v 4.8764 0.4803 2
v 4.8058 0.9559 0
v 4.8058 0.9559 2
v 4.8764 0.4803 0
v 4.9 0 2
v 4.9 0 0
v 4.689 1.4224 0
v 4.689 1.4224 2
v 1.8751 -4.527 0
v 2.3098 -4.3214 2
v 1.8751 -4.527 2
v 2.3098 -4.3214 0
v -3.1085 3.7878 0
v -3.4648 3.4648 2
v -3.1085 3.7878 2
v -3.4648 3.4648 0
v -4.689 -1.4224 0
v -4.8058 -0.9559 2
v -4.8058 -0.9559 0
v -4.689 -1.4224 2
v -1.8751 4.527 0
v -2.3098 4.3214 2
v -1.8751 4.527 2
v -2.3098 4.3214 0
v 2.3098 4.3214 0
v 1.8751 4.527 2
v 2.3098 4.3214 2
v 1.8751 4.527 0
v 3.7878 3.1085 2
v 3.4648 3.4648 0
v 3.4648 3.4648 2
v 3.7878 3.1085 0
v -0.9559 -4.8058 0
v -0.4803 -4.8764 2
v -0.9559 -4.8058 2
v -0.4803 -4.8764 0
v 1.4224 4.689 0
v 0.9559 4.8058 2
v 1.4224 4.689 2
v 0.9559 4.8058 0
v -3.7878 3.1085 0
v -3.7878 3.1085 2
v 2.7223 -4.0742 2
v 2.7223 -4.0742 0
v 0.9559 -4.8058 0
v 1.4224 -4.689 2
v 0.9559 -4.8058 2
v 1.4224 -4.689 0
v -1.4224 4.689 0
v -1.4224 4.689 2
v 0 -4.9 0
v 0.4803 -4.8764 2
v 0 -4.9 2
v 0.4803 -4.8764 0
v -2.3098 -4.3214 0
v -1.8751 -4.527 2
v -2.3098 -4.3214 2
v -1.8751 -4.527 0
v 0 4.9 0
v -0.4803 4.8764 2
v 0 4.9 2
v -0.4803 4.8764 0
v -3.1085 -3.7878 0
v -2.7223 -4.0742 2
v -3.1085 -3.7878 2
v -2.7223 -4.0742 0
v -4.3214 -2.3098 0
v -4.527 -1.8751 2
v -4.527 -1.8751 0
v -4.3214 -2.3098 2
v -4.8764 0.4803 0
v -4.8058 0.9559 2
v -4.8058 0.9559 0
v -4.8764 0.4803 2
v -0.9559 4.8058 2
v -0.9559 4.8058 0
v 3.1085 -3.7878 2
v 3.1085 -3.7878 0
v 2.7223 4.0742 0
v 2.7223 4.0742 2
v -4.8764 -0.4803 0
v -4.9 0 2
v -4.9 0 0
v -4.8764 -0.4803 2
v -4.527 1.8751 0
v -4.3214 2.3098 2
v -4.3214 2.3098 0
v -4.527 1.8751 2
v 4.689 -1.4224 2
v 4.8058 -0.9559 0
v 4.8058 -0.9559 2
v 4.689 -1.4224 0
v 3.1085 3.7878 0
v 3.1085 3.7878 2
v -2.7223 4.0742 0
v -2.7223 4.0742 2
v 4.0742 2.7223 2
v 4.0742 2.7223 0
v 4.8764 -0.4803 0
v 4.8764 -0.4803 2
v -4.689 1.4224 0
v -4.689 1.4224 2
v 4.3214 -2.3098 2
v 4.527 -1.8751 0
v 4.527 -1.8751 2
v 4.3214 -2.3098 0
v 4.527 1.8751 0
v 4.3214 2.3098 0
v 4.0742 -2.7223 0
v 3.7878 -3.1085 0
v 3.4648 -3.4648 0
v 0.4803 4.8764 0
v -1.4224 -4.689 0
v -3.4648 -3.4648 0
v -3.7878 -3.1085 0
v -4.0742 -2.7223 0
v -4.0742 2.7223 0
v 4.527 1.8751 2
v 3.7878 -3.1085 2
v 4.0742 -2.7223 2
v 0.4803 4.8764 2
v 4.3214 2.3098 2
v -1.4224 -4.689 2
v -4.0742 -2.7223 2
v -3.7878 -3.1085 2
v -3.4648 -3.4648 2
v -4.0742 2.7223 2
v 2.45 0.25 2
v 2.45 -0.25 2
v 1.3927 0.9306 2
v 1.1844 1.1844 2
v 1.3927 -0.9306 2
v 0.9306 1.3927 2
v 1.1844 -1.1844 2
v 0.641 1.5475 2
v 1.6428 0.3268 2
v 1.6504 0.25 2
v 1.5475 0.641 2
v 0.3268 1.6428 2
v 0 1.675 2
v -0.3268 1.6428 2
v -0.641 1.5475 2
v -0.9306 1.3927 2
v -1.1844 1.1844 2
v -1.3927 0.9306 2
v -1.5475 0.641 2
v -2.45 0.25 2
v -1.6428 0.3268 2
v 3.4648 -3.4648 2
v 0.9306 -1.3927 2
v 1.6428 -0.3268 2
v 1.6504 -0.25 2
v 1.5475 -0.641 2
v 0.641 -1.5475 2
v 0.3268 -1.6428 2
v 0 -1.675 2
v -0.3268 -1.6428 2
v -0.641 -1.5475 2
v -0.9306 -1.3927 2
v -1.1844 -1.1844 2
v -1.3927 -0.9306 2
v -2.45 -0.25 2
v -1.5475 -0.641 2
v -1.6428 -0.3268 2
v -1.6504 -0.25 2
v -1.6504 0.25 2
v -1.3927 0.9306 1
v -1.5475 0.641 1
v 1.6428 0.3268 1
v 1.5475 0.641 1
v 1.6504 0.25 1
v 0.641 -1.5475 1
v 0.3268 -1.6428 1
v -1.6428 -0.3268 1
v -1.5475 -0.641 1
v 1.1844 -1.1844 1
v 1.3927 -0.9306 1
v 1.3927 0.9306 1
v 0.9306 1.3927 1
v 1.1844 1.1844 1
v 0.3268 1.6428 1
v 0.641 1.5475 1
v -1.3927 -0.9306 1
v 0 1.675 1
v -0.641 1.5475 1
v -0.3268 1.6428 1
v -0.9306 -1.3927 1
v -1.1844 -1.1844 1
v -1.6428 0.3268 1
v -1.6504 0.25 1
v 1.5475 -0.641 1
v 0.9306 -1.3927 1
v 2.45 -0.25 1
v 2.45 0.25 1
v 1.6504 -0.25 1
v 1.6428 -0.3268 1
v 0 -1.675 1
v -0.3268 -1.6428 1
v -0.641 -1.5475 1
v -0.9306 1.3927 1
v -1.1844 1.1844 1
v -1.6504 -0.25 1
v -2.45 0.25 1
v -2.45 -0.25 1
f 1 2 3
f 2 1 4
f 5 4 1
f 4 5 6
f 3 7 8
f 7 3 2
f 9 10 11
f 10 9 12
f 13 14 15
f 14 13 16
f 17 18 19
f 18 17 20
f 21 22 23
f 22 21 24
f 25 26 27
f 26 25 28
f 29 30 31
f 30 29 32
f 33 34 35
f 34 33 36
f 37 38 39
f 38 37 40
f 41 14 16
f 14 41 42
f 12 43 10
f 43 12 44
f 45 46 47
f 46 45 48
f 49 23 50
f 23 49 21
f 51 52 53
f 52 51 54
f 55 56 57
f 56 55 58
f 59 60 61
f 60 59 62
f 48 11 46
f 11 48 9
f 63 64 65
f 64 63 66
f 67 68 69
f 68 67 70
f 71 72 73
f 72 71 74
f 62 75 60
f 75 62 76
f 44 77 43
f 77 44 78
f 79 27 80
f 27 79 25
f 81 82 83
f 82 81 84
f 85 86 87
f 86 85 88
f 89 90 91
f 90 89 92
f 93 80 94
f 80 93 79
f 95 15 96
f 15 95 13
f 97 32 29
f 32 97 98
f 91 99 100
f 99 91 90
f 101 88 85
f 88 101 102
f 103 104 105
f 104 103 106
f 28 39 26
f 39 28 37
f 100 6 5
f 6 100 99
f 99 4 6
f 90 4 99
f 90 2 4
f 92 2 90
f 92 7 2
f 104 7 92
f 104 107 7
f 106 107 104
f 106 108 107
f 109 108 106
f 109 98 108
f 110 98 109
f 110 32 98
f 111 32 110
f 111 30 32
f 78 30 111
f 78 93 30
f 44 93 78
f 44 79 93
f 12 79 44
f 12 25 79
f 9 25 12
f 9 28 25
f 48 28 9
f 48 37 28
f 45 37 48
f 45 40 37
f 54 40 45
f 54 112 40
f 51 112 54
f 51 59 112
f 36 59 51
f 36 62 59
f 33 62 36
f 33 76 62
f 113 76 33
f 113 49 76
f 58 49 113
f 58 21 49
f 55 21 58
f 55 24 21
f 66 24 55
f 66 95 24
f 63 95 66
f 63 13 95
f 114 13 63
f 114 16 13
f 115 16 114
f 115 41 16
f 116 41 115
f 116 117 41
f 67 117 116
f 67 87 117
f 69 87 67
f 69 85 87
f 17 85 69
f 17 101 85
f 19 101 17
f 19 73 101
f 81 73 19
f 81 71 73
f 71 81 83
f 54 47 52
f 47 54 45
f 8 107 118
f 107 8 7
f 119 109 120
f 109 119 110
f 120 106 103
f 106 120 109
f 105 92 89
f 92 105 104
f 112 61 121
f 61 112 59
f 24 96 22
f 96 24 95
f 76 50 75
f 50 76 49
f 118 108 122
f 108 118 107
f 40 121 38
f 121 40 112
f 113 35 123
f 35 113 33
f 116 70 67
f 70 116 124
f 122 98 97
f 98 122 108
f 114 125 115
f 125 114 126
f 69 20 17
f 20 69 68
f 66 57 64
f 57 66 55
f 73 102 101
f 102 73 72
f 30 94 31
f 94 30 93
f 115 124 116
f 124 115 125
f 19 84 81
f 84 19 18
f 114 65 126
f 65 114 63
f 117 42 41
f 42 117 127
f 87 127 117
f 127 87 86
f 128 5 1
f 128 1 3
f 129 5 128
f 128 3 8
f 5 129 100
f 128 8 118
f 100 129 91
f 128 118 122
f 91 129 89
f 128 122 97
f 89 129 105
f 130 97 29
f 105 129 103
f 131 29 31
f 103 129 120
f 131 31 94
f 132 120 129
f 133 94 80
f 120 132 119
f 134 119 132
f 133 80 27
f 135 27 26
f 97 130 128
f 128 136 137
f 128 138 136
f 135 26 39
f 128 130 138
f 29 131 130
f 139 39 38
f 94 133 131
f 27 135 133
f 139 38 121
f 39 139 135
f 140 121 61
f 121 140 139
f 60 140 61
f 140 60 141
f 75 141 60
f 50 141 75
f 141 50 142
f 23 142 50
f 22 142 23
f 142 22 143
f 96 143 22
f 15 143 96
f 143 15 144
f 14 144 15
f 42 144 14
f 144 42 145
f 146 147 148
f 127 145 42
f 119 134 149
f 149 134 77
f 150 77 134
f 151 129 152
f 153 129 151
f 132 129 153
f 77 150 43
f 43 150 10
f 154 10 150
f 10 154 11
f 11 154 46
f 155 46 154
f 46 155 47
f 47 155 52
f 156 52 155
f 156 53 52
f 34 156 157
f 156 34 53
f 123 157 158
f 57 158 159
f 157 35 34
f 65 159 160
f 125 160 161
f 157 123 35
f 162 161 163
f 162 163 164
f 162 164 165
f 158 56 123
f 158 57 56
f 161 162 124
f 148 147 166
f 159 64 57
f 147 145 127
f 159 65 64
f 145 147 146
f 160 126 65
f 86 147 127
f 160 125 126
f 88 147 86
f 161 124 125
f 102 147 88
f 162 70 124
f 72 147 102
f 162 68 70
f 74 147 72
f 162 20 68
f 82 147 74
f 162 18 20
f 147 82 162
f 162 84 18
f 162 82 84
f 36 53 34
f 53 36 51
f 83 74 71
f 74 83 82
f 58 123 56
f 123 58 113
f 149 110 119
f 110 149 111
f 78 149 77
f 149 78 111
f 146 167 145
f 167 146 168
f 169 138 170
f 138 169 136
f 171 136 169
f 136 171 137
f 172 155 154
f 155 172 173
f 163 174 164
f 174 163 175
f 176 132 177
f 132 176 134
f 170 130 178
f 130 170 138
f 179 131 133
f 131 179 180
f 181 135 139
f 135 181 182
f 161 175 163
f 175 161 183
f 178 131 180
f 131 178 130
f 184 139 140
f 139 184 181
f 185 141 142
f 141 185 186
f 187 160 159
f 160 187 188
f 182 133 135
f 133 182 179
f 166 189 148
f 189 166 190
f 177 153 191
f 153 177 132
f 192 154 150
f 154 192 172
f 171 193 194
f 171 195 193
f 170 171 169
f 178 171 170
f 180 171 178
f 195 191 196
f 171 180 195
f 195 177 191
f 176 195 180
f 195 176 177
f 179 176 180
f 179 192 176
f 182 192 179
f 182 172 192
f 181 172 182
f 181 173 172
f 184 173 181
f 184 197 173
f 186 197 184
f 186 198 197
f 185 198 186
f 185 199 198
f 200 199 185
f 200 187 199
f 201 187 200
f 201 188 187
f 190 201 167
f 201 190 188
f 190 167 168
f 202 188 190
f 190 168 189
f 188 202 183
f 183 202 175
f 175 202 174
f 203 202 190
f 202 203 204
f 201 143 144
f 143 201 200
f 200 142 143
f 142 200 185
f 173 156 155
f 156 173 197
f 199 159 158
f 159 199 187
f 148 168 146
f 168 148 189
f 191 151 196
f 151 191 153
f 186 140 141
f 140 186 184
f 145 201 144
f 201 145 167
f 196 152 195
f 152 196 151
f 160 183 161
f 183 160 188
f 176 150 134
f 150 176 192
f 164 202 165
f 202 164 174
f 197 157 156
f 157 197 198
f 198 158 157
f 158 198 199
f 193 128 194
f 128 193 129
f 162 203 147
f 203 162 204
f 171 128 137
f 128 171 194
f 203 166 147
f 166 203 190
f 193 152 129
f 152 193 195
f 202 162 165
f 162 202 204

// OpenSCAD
// file: params.scad
// --- Display ---
display_w        = 112.5;  // display panel width  (mm) — portrait
display_h        = 170;    // display panel height (mm) — portrait
disp_thickness   =   1.25; // display panel thickness (mm)
screen_area_w    = 100;    // active screen width  (mm)
screen_area_h    = 165;    // active screen height (mm)
display_border_wide  =  9.5;  // wide border (long edge, assumed right; TBD after driver rotation)
display_border_narrow=  2.5;  // narrow border (long edge)
display_border_short =  2;    // short-edge border (top and bottom)

// --- Cavities (back shell interior) ---
elec_w         =  65;    // Pi Zero width  (mm)
elec_l         =  30;    // Pi Zero length (mm)
elec_depth     =  16;    // Pi Zero + PiSugar stack depth (mm) — 15.7mm actual
hat_w          =  30;    // Waveshare HAT width  (mm) — rotated 90° in case
hat_l          =  66;    // Waveshare HAT length (mm)
hat_depth      =   9.5;  // Waveshare HAT depth  (mm)
bat_w          =  28;    // battery width  (mm) — portrait: 28×59 footprint
bat_l          =  59;    // battery length (mm)
bat_depth      =  12.5;  // battery depth  (mm) — 10.7 body + 1.8 magnet

// --- Primitives first (no dependencies) ---
case_w         = 135;    // width  (mm) — 135mm clears 4mm nut towers with 1.5mm margin right of display
case_h         = 210;    // height (mm) — 2+170+35+2=209 → 210
front_depth    =   2;    // front bezel thickness (mm)
back_depth     =  20;    // back shell depth (mm) — elec_depth 15.7 + 2 wall + 2.3 clearance; unconfirmed
fillet_r       =   2;    // outer-edge fillet radius (mm)
edge_overhang_angle = 55; // chamfer→fillet transition (deg from horizontal); 45=safe, 55=X1C tuned
tol            = 0.2;    // FDM clearance on each mating face (mm)
wall_t         = 2;      // nominal wall thickness (mm)

// --- PiSugar flex-tab buttons (south wall) ---
btn_hinge_w   = 0.8;  // hinge strip width (mm) — right short edge, in-layer bending
btn_slot_kerf = 0.5;  // slot kerf width (mm) — 1 nozzle diameter

// --- Button area (front face, lower section below display) ---
btn_area_h     =  35;    // height of button zone at bottom of front face (mm)
btn_rows       =   2;
btn_cols       =   4;
btn_hole_tolerance = 0.2;
btn_hole_diameter = 10; // button hole diameter (mm) — physical cap sized to fit with tol clearance
btn_fillet_r   =   2;    // fillet radius on button hole outer edge (mm)
btn_zone_w     = case_w / btn_cols;   // each button is centred in its zone
btn_row_y1     = btn_area_h / 2 - 7;  // bottom row y centre
btn_row_y2     = btn_area_h / 2 + 7;  // top row y centre (closer to display)

// --- Magnet recesses (back plate inner face) ---
magnet_d            = 15;   // diameter (mm) — derived from PiSugar image; tune after measuring
magnet_recess_depth = 1.5;  // depth into back plate; leaves 0.5mm wall

// --- Mating-face rabbet/tongue joint ---
rabbet_w       = 1;      // rabbet width into inner wall face (mm)
rabbet_d       = 1.5;    // rabbet depth from mating face (mm) — 2mm coincided with HDMI outer top

// --- M2 fasteners ---
screw_boss_id  = 2.4;    // screw shank clearance diameter (mm)
screw_head_d   = 3.8;    // screw head diameter (mm) — M2 button head
screw_head_h   = 1.4;    // screw head height (mm) — sinks fully in 2mm wall
screw_depth    = 25;     // total clearance hole depth from exterior (mm)
nut_af         = 4;      // hex nut across-flats (mm)
nut_t          = 1.6;    // hex nut thickness (mm)
tower_h        = 17;     // nut tower height from front plate inner face (mm) — 17mm leaves 1mm above back floor
tower_w        = 15;     // nut tower width in Y (mm)
// Y centres of the two screws per side; symmetric around case_h/2, clear of Pi stack (Y<32)
side_screw_y   = [case_h / 2 - case_h * 0.3, case_h / 2 + case_h * 0.3];

// --- USB-C notch ---
usbc_notch_w   =  12;    // notch width  (mm)
usbc_notch_h   =   4;    // notch height (mm)

// --- Derived positions (all dependencies above) ---
// Y=0 at bottom (USB-C / south face); X=0 at left inner wall
_elec_x  = wall_t;                   // Pi Zero left edge
_elec_y  = wall_t;                   // Pi Zero bottom edge (USB-C face)
_bat_x   = wall_t + elec_w - bat_w;  // battery right edge aligned with Pi Zero right edge
_bat_y   = wall_t + elec_l;          // battery bottom edge above Pi Zero
_hat_x   = wall_t + elec_w;          // HAT left edge = Pi Zero right edge
_hat_y   = wall_t;                   // HAT bottom edge flush with Pi Zero
// Display: active area centred; wide border on right long edge
_screen_x = (case_w - screen_area_w) / 2;   // active screen X centre in case
_disp_x   = _screen_x - display_border_narrow; // panel left edge (narrow border on left)
_disp_y   = btn_area_h + (case_h - btn_area_h - display_h) / 2;  // panel vertically centred above buttons
// (boss_inset removed — corner bosses replaced by side-entry screw towers)
// main file
// Button cap — press-fits over 3.5mm square tactile switch stem, sits in 10mm front-bezel hole
include <params.scad>

_btn_d    = btn_hole_diameter - btn_hole_tolerance;  // 9.8mm
_btn_h    = 2;    // cap height (mm)
// TODO: Remove 3.5 too wide, 3.25 too tight
_stem_d   = 3.35;  // tactile switch stem diameter for socket (mm)
_sock_d   = 1;    // socket depth (mm)
_kerf_l   = _btn_d / 2;  // kerf cut length (half button diameter)
_kerf_w   = 0.5;  // kerf cut width (mm)

difference() {
    cylinder(d=_btn_d, h=_btn_h, $fn=64);

    // stem socket — centred, from top
    translate([0, 0, _btn_h - _sock_d])
        cylinder(d=_stem_d, h=_sock_d + 0.1, $fn=32);

    // kerf cut — tolerance compensation, centred, from top
    translate([-_kerf_l / 2, -_kerf_w / 2, _btn_h - _sock_d])
        cube([_kerf_l, _kerf_w, _sock_d + 0.1]);
}
